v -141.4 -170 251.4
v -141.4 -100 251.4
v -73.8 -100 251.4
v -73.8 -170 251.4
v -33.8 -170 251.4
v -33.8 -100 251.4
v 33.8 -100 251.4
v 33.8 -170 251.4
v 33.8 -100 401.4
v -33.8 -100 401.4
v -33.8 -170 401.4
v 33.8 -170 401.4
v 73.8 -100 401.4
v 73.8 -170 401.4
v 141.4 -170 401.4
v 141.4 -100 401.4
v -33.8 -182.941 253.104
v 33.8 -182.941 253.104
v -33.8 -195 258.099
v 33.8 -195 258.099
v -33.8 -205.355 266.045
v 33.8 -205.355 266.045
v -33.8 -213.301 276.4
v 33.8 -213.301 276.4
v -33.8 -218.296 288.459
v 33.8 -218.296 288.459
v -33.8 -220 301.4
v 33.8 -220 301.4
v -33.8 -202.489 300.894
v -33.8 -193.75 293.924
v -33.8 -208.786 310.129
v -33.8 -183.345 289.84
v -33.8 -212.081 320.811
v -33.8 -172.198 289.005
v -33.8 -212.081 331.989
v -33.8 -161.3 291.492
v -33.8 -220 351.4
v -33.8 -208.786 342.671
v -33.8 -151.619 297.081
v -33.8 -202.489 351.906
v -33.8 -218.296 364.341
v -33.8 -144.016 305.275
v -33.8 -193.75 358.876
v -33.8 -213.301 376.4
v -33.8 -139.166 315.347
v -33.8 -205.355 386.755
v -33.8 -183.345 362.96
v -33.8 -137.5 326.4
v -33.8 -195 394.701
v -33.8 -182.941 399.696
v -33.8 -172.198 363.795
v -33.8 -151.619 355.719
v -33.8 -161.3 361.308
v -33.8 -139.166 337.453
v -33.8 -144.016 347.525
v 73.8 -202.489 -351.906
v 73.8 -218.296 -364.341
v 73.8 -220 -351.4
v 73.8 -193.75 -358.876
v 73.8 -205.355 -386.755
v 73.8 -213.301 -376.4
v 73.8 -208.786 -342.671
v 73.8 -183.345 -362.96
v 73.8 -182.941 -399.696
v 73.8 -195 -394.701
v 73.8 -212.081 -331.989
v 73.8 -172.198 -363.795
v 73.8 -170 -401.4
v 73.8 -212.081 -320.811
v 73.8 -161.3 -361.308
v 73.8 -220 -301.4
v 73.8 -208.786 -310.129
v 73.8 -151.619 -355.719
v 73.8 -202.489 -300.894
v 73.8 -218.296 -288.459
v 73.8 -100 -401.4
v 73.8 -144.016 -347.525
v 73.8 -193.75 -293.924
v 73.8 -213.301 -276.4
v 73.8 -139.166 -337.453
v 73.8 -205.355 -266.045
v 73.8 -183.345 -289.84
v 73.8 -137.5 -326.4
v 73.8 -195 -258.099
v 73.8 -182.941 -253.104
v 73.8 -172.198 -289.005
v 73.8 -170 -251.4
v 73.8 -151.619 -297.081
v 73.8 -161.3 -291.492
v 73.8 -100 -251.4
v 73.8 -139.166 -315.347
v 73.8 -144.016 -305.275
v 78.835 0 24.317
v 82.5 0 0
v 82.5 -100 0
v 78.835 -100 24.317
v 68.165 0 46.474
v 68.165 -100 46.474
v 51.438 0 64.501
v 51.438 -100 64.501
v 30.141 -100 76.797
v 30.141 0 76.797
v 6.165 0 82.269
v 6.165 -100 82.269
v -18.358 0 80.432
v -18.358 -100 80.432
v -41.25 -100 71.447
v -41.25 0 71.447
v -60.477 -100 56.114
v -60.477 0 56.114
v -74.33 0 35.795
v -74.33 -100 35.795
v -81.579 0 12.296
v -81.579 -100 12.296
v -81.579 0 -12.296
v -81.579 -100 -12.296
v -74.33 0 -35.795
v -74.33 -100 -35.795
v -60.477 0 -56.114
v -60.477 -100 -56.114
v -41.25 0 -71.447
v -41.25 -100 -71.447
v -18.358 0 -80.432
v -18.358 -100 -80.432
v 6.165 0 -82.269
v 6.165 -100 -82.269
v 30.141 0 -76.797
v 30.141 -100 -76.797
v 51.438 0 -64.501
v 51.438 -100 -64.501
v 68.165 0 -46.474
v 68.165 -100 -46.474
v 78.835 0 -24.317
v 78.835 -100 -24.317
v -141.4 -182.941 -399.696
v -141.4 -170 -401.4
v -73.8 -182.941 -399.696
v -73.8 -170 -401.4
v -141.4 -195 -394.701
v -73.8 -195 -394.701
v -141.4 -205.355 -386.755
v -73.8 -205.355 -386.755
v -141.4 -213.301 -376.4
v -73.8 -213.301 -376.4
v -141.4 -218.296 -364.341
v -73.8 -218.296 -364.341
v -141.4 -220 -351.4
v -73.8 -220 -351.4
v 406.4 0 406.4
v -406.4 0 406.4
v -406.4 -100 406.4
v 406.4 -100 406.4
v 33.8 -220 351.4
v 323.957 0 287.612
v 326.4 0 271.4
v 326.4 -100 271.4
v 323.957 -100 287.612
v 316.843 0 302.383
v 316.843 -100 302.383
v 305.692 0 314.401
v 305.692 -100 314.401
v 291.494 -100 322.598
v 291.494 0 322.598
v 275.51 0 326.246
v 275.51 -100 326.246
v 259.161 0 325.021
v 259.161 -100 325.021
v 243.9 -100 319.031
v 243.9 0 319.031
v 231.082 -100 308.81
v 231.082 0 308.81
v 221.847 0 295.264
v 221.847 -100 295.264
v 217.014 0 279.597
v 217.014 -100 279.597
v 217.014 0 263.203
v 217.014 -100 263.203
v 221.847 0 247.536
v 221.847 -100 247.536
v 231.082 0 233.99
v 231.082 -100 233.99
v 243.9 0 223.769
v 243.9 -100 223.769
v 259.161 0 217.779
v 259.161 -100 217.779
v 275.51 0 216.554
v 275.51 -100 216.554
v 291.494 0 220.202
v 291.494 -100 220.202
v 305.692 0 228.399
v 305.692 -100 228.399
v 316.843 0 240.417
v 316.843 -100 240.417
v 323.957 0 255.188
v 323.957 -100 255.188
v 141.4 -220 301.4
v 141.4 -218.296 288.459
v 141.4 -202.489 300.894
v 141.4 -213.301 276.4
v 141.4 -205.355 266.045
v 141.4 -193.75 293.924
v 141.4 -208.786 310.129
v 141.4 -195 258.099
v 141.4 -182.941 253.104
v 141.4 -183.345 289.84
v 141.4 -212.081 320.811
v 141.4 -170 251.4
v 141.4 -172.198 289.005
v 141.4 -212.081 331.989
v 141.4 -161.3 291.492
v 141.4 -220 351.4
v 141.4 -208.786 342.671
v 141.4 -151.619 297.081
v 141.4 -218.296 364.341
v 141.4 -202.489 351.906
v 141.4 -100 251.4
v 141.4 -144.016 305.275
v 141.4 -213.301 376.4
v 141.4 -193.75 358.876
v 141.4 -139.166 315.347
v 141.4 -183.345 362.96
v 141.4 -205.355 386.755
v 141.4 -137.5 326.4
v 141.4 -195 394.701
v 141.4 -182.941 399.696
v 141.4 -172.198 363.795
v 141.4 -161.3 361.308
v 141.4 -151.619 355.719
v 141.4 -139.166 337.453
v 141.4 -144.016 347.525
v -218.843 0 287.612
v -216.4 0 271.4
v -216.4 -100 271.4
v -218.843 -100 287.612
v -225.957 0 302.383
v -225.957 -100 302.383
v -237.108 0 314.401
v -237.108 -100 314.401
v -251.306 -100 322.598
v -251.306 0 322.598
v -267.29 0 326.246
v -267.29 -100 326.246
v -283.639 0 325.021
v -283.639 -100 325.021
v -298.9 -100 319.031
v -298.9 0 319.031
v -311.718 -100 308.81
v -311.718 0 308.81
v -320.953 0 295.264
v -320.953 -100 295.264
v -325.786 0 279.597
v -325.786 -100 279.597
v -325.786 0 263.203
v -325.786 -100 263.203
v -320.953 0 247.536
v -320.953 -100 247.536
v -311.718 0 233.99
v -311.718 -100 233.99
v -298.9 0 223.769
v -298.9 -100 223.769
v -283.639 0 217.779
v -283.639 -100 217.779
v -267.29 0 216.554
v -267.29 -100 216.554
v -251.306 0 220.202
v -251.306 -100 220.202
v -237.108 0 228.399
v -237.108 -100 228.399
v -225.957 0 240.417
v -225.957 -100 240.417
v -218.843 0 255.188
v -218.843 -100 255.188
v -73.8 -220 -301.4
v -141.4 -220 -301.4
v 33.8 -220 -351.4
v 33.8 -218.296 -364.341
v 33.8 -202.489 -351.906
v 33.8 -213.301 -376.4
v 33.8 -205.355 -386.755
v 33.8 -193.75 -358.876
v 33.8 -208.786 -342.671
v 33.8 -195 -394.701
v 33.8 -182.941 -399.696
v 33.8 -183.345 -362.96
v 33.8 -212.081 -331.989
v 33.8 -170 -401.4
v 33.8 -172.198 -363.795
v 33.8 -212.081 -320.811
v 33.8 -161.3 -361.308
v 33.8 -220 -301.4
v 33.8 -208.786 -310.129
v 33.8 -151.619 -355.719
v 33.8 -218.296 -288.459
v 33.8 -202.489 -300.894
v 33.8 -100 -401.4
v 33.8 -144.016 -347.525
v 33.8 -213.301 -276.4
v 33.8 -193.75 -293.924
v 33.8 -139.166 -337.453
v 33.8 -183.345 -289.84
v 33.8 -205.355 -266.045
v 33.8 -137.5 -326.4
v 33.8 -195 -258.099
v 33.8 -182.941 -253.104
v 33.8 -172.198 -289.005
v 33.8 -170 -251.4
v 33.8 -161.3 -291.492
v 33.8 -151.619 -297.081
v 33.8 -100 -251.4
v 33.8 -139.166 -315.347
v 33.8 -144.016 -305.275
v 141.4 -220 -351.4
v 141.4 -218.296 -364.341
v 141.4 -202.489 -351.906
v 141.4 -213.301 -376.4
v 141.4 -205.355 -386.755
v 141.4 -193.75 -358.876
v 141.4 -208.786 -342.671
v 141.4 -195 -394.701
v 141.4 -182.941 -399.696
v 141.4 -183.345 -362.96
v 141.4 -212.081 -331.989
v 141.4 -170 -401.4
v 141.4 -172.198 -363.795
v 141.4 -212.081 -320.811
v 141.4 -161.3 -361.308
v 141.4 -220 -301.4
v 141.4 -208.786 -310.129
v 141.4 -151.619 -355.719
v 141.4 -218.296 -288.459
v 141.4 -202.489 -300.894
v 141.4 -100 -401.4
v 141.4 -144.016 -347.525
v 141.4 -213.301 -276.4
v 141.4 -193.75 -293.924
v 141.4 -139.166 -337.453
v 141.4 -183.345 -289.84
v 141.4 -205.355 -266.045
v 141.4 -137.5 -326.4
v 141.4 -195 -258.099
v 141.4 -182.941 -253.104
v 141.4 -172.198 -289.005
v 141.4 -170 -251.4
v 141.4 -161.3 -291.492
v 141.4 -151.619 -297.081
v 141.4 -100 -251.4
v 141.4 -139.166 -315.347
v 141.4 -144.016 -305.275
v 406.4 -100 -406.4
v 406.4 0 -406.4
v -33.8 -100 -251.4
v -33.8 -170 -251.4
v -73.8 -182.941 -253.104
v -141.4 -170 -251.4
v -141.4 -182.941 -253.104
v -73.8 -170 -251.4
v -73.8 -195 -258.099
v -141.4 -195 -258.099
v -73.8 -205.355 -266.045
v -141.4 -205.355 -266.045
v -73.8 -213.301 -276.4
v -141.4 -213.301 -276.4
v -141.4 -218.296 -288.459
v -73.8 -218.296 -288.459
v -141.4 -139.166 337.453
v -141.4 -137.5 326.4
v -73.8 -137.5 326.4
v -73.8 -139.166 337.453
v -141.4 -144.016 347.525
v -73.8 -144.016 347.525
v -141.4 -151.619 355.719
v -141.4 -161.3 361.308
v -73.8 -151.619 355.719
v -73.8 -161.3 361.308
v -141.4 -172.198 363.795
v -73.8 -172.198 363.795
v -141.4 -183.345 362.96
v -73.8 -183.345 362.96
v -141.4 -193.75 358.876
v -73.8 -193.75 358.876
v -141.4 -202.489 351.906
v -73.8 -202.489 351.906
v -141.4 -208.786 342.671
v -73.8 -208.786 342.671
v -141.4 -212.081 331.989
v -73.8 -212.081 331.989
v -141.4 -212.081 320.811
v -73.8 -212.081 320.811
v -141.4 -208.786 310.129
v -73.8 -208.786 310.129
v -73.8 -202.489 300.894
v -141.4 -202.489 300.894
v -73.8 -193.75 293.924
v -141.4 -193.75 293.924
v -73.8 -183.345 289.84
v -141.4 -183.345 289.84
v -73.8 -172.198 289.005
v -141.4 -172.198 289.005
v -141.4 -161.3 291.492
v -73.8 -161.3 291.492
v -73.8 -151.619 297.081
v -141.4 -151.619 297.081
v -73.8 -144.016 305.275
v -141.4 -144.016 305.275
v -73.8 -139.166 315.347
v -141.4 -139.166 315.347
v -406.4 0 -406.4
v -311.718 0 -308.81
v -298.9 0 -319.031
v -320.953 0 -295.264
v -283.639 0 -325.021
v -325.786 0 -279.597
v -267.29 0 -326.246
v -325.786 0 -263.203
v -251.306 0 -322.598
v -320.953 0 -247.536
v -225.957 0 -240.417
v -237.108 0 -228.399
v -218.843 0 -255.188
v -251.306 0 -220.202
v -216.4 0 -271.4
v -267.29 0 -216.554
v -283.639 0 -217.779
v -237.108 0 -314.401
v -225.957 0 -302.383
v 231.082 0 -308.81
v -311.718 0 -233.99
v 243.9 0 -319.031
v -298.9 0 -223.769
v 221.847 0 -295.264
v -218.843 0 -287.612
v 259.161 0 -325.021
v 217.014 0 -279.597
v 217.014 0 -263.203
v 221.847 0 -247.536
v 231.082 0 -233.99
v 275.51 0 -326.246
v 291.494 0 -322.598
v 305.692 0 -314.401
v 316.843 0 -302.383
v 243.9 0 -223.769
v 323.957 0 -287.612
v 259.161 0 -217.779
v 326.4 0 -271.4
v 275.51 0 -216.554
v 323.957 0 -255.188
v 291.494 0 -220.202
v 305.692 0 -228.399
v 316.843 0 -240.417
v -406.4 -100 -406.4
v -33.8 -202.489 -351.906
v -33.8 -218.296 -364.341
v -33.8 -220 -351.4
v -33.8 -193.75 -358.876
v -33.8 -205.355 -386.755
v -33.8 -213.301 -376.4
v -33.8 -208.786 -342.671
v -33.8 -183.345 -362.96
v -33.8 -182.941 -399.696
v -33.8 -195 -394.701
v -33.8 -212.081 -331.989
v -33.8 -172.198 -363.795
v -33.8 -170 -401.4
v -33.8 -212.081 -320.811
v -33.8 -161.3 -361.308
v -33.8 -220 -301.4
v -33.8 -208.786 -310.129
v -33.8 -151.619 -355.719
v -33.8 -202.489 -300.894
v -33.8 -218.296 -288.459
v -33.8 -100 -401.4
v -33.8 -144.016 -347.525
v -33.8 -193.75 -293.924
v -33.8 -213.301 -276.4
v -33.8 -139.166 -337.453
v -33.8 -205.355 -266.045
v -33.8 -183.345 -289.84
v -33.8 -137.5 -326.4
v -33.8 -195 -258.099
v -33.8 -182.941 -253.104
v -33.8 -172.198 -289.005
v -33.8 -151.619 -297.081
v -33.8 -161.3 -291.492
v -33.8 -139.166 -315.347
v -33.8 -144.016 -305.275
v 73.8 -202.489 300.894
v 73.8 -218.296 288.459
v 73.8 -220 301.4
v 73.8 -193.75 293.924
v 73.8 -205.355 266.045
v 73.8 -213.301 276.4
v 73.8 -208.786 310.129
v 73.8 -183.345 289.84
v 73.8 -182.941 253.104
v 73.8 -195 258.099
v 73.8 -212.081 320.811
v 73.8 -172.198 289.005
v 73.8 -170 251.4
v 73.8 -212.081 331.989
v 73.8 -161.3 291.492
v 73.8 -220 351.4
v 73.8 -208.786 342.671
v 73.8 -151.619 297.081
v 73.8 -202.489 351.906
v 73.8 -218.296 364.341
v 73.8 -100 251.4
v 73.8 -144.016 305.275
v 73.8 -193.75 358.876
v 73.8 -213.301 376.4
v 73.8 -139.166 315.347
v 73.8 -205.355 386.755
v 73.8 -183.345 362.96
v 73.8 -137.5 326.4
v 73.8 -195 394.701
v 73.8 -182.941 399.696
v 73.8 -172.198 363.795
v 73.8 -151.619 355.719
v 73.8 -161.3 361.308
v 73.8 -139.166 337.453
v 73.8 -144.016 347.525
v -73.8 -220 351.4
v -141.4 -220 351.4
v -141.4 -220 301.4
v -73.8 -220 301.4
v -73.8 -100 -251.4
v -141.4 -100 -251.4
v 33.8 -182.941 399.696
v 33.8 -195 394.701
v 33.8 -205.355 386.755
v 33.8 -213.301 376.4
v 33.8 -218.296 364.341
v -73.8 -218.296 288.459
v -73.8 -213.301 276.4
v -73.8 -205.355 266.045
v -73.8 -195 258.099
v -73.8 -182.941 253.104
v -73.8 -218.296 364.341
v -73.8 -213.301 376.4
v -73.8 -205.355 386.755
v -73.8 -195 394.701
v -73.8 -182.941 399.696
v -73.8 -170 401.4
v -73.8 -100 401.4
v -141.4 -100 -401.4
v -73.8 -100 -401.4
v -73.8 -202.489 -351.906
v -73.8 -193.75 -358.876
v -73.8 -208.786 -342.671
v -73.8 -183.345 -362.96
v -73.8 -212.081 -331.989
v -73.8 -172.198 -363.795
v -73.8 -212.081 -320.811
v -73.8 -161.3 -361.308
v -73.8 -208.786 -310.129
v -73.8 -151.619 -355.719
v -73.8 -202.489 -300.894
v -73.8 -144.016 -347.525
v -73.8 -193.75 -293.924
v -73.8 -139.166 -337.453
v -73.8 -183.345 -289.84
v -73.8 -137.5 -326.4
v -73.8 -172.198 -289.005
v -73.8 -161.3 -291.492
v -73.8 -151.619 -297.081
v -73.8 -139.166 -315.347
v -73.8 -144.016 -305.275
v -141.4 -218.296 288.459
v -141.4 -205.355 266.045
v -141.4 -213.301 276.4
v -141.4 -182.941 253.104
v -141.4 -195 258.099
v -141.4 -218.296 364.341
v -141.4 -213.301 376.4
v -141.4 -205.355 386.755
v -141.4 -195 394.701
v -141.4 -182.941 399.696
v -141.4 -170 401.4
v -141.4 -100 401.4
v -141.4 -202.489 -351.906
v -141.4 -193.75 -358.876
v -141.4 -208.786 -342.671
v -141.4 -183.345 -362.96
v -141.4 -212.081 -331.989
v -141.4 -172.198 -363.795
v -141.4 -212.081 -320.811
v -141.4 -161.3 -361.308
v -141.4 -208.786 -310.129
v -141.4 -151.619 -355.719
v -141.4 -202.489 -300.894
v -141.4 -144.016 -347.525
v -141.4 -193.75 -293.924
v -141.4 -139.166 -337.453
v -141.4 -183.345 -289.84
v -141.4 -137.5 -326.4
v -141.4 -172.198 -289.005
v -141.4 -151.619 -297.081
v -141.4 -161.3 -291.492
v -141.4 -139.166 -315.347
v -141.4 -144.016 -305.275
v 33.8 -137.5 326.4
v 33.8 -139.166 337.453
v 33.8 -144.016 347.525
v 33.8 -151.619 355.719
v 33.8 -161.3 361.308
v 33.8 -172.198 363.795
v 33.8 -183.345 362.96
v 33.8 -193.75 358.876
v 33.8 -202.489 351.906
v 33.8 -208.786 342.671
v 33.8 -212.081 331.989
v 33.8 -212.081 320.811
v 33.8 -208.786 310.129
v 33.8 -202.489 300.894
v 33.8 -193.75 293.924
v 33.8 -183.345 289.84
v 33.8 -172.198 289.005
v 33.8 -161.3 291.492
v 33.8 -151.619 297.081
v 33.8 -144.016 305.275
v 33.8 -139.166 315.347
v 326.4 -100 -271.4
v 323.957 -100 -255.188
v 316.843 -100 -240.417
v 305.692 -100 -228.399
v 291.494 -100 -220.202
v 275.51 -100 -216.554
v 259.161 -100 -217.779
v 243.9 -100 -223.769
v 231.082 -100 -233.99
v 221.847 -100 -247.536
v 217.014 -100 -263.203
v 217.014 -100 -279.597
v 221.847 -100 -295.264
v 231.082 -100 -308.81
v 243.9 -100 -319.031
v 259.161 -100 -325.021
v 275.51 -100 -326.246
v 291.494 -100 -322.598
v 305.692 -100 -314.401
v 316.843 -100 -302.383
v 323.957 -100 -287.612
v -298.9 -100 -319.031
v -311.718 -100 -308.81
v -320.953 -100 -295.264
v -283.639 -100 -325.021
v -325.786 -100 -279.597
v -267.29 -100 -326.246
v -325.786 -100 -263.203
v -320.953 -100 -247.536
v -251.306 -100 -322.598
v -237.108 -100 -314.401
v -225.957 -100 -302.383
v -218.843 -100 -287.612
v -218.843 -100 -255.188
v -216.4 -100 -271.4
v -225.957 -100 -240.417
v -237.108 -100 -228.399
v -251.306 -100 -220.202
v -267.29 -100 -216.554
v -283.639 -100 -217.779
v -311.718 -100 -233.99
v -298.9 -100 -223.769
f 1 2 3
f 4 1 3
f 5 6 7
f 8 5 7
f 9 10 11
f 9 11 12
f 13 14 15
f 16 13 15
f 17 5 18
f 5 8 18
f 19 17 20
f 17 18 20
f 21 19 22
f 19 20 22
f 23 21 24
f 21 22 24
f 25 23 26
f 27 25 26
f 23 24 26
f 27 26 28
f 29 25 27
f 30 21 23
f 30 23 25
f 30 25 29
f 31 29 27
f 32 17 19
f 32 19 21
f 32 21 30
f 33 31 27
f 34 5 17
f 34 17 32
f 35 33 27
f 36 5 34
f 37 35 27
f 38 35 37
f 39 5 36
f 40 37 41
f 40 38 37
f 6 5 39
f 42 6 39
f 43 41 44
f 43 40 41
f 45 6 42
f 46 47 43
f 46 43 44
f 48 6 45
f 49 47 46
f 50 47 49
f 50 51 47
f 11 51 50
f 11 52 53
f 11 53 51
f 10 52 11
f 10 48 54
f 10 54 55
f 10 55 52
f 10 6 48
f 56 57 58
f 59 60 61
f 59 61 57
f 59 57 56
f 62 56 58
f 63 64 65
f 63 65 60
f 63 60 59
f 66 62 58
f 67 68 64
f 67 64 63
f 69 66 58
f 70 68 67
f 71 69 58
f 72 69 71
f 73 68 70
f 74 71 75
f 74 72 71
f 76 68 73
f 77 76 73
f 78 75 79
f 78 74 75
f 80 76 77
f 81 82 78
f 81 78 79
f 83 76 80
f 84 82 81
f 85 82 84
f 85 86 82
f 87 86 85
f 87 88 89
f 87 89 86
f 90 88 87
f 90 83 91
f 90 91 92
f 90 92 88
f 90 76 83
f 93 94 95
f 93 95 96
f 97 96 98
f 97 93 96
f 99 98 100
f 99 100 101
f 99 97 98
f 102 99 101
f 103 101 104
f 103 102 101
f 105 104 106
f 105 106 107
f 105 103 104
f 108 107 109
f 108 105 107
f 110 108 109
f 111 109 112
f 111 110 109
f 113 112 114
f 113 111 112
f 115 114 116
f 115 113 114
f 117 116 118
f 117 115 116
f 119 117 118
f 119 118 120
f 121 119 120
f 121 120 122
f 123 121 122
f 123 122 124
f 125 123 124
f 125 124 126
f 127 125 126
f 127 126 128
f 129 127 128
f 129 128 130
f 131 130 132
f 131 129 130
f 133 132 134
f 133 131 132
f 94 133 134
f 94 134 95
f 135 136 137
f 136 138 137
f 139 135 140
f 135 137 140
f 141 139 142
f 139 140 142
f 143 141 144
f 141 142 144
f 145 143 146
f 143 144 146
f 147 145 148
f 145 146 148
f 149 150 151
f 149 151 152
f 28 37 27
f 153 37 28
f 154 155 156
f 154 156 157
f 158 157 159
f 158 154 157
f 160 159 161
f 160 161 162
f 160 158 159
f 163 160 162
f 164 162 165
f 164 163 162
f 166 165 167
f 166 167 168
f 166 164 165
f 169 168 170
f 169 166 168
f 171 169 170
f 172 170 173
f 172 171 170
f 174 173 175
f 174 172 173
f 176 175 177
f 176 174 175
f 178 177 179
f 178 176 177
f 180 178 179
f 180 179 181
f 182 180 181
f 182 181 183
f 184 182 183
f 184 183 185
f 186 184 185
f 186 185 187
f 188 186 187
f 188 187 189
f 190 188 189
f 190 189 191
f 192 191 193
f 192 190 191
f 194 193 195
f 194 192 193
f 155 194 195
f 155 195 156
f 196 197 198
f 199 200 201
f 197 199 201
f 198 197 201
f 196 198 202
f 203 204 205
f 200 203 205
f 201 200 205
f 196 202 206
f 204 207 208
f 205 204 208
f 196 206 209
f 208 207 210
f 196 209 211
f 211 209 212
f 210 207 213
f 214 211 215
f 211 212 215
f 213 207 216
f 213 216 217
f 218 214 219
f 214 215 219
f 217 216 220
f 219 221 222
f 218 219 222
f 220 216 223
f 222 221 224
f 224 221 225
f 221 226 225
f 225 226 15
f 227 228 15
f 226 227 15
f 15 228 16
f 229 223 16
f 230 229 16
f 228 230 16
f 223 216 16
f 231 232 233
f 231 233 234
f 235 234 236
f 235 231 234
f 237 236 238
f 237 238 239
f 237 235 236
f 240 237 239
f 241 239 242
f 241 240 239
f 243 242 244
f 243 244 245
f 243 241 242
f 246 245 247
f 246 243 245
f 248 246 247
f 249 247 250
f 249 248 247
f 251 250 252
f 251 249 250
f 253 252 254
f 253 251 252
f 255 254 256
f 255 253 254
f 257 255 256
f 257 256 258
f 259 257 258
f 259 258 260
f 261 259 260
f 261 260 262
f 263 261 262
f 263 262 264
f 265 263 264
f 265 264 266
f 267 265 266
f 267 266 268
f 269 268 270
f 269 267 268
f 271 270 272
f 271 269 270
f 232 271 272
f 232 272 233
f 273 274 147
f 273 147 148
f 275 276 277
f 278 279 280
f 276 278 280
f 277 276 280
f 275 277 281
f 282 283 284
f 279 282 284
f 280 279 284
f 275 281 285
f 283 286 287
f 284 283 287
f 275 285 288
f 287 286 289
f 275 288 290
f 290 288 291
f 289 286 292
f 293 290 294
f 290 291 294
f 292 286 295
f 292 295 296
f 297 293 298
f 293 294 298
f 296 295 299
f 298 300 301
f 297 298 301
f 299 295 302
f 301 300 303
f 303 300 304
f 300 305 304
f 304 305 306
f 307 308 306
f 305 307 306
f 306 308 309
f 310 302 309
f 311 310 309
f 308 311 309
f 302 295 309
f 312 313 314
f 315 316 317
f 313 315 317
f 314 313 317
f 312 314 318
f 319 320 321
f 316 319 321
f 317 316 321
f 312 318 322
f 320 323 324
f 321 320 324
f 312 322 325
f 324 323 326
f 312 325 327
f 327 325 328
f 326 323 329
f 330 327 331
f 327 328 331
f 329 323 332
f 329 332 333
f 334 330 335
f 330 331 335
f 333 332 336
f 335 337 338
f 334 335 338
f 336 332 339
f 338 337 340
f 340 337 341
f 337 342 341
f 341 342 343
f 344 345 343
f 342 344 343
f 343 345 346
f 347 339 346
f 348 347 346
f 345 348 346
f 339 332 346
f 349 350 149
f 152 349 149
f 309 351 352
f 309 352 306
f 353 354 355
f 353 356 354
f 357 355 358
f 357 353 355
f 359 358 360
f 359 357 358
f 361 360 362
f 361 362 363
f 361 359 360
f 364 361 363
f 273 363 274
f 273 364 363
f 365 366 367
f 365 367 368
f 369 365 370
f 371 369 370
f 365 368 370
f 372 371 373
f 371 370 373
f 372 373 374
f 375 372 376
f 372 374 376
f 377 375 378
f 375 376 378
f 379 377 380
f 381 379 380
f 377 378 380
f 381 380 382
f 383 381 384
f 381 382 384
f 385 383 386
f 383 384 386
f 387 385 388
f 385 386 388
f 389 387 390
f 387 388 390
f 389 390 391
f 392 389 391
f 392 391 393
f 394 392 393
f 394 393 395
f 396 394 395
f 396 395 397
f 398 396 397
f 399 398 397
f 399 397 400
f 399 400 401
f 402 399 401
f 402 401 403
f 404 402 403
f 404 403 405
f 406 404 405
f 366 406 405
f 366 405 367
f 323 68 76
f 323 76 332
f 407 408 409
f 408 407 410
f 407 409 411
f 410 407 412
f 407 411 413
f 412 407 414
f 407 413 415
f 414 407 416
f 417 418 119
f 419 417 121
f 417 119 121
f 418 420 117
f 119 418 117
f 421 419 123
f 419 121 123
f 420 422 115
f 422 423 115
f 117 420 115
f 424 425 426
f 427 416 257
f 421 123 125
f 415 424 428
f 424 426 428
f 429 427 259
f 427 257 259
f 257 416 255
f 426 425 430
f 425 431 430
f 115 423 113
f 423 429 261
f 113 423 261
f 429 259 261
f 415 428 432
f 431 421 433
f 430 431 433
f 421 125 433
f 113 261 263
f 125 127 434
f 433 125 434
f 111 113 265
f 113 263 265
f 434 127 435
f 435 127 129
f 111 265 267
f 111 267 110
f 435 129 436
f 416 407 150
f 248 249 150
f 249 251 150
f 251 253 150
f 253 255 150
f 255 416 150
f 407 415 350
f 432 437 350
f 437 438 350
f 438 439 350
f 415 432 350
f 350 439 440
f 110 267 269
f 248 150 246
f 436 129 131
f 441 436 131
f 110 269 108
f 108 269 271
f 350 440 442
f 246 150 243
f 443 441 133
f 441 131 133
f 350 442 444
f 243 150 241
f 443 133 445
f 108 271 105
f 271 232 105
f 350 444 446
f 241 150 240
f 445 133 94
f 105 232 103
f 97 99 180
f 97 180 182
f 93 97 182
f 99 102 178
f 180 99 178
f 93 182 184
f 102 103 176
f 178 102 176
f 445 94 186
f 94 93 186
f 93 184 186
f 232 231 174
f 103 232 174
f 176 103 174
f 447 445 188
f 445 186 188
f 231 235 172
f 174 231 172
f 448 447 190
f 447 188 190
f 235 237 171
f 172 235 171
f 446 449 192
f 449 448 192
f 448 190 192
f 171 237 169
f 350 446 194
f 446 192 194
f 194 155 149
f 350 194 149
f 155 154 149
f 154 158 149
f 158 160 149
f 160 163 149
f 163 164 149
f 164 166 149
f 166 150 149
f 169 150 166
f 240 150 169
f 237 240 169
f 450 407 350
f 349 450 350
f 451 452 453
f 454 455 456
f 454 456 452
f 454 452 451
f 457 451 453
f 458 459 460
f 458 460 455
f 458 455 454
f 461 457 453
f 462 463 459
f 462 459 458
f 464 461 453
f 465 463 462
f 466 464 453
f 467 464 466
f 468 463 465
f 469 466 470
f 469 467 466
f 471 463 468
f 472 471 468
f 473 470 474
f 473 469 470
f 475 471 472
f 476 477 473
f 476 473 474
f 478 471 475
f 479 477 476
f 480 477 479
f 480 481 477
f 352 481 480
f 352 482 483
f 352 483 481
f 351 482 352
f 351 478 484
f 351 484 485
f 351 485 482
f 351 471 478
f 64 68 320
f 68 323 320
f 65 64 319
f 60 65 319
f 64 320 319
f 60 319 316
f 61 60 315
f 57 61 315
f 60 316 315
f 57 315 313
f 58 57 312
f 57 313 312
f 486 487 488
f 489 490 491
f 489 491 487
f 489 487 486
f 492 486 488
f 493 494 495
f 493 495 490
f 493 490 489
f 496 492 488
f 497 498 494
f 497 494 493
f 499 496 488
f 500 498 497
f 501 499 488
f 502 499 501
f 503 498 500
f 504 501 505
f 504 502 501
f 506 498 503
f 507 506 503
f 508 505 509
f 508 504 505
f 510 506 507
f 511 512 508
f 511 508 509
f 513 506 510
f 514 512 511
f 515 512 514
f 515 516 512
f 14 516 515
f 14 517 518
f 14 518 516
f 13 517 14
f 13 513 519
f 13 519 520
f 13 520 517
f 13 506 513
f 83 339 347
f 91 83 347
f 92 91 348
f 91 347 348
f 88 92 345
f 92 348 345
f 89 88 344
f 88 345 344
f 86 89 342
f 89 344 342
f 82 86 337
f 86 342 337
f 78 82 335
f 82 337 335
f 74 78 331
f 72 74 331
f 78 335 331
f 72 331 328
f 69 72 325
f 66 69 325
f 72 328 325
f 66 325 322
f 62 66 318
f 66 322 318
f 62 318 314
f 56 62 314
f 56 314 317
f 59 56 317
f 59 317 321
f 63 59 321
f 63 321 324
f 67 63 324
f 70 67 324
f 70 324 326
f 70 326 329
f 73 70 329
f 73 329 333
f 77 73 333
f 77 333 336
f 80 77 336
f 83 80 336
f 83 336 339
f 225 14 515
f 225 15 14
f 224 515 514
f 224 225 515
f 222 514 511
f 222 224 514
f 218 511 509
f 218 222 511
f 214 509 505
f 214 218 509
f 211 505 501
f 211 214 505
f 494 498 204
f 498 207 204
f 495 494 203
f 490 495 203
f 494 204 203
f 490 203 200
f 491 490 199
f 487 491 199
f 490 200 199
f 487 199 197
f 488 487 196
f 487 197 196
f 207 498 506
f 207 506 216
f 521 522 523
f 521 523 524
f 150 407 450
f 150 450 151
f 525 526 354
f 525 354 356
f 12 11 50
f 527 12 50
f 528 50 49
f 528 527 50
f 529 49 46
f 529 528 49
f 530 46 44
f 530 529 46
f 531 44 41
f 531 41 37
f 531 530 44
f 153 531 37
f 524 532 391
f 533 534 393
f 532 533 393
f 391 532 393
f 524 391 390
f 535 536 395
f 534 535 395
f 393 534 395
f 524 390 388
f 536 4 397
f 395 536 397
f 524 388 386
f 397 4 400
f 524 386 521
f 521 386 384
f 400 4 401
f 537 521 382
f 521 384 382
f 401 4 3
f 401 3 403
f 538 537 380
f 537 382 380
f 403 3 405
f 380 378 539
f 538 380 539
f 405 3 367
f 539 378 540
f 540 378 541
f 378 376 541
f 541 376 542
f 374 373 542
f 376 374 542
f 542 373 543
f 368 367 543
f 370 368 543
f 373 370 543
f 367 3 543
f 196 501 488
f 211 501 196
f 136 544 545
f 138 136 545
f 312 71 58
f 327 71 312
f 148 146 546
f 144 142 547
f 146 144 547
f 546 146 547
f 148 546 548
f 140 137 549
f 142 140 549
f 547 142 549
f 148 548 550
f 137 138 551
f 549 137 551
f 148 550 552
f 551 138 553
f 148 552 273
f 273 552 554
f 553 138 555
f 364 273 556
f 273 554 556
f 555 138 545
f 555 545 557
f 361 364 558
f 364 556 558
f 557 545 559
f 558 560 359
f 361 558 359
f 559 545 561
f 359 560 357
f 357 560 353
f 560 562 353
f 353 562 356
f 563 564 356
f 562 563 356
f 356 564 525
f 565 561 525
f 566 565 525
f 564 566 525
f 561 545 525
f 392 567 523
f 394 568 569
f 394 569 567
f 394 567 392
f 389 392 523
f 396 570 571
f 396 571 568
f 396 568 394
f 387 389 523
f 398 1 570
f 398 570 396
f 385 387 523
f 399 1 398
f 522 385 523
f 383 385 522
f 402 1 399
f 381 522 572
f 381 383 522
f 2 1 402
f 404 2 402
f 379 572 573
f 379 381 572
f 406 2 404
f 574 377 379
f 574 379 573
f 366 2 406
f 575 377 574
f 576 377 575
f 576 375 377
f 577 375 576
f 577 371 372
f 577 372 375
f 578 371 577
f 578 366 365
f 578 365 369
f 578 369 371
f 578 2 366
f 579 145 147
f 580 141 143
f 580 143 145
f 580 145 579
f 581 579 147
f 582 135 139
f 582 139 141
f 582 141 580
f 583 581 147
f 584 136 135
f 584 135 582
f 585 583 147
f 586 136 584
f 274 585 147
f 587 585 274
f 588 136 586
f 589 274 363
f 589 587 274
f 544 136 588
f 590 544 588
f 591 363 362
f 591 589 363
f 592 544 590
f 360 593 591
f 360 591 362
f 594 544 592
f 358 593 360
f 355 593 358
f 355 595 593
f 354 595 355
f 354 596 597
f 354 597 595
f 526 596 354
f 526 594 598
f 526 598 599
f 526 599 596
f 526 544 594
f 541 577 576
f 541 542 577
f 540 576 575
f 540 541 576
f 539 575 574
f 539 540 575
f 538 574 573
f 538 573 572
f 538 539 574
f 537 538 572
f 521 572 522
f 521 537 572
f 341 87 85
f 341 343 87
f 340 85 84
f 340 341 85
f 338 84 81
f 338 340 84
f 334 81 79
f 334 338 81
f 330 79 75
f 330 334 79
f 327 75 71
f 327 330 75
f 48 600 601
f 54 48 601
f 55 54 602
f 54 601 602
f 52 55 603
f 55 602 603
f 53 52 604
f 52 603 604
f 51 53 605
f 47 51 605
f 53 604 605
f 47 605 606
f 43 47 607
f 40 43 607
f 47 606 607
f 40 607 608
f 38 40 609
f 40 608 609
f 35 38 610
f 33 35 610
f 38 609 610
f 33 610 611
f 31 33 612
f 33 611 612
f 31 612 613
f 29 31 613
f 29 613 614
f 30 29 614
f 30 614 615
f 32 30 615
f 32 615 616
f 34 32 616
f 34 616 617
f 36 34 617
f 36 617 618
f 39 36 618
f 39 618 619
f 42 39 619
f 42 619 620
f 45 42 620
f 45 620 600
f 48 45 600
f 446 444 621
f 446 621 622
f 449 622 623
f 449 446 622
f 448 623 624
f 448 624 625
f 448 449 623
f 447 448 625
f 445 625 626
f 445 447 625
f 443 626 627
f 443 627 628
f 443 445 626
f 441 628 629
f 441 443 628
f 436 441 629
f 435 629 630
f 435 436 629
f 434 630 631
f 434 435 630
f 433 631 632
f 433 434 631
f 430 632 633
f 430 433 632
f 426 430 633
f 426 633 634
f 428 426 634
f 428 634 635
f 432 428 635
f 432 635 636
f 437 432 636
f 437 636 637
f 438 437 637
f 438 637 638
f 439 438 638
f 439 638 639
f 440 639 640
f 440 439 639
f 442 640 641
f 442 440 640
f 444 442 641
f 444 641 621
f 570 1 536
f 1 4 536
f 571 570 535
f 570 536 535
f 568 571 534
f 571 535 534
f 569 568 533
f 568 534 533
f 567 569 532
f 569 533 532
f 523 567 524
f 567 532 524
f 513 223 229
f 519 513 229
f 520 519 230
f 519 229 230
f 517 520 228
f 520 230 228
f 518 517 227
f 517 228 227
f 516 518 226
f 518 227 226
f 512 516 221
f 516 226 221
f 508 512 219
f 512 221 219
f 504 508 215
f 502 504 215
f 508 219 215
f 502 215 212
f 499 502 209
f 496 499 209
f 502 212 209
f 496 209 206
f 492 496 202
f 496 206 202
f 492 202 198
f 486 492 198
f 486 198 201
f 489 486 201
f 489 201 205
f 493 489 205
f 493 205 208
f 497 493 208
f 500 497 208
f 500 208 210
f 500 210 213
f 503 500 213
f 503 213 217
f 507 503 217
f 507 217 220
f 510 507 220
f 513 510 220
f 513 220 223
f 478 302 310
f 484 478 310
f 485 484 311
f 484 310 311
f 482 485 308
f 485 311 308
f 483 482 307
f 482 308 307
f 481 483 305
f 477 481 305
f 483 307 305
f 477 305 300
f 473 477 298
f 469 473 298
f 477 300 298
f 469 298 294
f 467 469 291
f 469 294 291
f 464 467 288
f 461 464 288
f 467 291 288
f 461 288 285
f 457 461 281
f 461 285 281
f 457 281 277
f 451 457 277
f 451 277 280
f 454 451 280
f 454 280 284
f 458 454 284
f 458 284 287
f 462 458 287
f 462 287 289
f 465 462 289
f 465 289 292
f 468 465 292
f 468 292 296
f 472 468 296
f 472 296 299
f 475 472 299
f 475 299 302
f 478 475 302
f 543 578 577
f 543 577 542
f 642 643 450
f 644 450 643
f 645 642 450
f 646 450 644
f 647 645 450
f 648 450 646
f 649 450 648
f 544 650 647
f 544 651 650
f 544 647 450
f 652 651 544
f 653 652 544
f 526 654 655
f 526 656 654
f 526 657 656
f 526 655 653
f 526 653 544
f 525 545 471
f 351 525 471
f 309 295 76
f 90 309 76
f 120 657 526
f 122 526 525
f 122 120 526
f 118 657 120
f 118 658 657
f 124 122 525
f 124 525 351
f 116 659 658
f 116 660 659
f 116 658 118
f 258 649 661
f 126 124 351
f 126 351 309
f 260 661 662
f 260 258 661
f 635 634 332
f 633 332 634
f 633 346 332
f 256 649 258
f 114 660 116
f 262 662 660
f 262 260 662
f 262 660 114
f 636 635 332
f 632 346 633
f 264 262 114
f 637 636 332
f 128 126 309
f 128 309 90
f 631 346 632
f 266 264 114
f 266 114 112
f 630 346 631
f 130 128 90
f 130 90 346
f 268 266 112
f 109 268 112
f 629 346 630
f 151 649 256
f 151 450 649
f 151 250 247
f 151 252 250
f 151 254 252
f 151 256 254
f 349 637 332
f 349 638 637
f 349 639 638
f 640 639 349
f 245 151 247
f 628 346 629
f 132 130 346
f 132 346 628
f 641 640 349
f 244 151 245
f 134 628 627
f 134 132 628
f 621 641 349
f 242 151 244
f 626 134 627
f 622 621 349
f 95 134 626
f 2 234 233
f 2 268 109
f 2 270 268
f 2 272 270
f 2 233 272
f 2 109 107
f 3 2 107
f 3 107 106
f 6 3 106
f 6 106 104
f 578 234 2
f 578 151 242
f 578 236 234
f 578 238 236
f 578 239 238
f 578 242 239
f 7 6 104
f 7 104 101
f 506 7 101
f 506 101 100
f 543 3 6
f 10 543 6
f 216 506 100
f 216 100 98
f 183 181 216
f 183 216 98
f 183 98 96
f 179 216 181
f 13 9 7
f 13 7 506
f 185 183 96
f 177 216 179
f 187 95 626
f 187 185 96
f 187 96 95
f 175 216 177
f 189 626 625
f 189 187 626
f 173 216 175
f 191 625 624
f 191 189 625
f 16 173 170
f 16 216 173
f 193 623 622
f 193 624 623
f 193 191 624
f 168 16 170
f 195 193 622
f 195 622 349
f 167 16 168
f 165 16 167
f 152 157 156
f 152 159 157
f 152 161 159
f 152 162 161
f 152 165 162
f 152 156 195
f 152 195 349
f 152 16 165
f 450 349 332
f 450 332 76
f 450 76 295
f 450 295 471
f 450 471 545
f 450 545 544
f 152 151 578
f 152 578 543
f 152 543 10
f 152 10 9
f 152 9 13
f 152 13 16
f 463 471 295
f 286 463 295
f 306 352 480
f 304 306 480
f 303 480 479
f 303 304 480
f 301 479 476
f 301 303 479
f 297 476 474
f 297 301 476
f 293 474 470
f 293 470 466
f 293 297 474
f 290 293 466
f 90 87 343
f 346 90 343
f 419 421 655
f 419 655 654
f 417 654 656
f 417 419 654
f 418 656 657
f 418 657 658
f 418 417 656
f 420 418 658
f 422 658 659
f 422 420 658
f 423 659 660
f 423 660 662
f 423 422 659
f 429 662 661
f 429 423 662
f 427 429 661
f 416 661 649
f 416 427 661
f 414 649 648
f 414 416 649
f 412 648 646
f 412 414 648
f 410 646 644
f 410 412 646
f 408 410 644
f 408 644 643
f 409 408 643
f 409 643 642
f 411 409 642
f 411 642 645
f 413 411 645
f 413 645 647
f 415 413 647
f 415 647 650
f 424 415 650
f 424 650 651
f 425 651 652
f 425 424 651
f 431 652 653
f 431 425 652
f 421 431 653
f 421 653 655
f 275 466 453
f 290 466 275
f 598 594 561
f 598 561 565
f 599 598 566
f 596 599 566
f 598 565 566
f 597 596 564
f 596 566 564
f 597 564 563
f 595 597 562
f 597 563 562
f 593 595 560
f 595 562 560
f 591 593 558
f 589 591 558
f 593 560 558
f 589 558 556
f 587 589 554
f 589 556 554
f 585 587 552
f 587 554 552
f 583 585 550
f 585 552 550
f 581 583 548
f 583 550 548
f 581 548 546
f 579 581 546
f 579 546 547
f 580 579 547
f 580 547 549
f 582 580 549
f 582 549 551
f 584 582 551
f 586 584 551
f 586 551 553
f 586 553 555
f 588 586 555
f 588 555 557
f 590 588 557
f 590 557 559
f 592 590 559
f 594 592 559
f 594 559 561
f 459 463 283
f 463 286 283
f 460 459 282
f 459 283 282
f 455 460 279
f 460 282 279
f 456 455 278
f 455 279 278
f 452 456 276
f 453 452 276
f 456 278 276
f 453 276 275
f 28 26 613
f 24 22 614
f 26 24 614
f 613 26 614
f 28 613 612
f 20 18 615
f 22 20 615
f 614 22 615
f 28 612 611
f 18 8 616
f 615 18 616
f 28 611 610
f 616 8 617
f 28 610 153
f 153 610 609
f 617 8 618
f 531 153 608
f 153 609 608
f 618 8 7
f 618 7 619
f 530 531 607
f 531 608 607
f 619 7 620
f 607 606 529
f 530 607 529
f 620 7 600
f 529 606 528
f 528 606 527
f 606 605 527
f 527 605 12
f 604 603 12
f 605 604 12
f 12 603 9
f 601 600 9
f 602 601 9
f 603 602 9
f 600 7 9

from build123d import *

# Parameters (mm, degrees)
F0_W     = 812.8
F0_H     = 812.8
F0_R     = 55
F0_R_2   = 82.5
F1_DEPTH = 100
F2_W     = 67.6
F2_H     = 150
F3_DEPTH = 120
F4_R     = 50
F5_R     = 37.5
F6_DEPTH = 547.801


with BuildPart() as f1:
    # F0 (on Front) → F1 (new body)
    with BuildSketch(Plane.XZ):
        Rectangle(F0_W, F0_H)
        with Locations((-271.4, -271.4)):
            Circle(F0_R, mode=Mode.SUBTRACT)
        Circle(F0_R_2, mode=Mode.SUBTRACT)
        with Locations((271.4, -271.4)):
            Circle(F0_R, mode=Mode.SUBTRACT)
        with Locations((-271.4, 271.4)):
            Circle(F0_R, mode=Mode.SUBTRACT)
        with Locations((271.4, 271.4)):
            Circle(F0_R, mode=Mode.SUBTRACT)
    extrude(amount=F1_DEPTH)

    # F2 (on face) → F3 (join)
    with BuildSketch(Plane.XZ.offset(100)):
        with Locations((-107.6, 326.4)):
            Rectangle(F2_W, F2_H)
        with Locations((0, 326.4)):
            Rectangle(F2_W, F2_H)
        with Locations((107.6, 326.4)):
            Rectangle(F2_W, F2_H)
        with Locations((107.6, -326.4)):
            Rectangle(F2_W, F2_H)
        with Locations((-107.6, -326.4)):
            Rectangle(F2_W, F2_H)
        with Locations((0, -326.4)):
            Rectangle(F2_W, F2_H)
    extrude(amount=F3_DEPTH)

    # F4
    f4_edges = [f1.edges().sort_by_distance(p)[0] for p in [
        (107.6, -220, -401.4),
        (0, -220, -401.4),
        (-107.6, -220, -401.4),
        (-107.6, -220, -251.4),
        (0, -220, -251.4),
        (107.6, -220, -251.4),
        (107.6, -220, 251.4),
        (107.6, -220, 401.4),
        (0, -220, 251.4),
        (0, -220, 401.4),
        (-107.6, -220, 401.4),
        (-107.6, -220, 251.4),
    ]]
    fillet(f4_edges, radius=F4_R)

    # F5 (on face) → F6 (cut, through all)
    with BuildSketch(Plane.YZ.offset(141.4)):
        with Locations((-175, -326.4)):
            Circle(F5_R)
        with Locations((-175, 326.4)):
            Circle(F5_R)
    extrude(amount=-F6_DEPTH, mode=Mode.SUBTRACT)


solid = f1.part
